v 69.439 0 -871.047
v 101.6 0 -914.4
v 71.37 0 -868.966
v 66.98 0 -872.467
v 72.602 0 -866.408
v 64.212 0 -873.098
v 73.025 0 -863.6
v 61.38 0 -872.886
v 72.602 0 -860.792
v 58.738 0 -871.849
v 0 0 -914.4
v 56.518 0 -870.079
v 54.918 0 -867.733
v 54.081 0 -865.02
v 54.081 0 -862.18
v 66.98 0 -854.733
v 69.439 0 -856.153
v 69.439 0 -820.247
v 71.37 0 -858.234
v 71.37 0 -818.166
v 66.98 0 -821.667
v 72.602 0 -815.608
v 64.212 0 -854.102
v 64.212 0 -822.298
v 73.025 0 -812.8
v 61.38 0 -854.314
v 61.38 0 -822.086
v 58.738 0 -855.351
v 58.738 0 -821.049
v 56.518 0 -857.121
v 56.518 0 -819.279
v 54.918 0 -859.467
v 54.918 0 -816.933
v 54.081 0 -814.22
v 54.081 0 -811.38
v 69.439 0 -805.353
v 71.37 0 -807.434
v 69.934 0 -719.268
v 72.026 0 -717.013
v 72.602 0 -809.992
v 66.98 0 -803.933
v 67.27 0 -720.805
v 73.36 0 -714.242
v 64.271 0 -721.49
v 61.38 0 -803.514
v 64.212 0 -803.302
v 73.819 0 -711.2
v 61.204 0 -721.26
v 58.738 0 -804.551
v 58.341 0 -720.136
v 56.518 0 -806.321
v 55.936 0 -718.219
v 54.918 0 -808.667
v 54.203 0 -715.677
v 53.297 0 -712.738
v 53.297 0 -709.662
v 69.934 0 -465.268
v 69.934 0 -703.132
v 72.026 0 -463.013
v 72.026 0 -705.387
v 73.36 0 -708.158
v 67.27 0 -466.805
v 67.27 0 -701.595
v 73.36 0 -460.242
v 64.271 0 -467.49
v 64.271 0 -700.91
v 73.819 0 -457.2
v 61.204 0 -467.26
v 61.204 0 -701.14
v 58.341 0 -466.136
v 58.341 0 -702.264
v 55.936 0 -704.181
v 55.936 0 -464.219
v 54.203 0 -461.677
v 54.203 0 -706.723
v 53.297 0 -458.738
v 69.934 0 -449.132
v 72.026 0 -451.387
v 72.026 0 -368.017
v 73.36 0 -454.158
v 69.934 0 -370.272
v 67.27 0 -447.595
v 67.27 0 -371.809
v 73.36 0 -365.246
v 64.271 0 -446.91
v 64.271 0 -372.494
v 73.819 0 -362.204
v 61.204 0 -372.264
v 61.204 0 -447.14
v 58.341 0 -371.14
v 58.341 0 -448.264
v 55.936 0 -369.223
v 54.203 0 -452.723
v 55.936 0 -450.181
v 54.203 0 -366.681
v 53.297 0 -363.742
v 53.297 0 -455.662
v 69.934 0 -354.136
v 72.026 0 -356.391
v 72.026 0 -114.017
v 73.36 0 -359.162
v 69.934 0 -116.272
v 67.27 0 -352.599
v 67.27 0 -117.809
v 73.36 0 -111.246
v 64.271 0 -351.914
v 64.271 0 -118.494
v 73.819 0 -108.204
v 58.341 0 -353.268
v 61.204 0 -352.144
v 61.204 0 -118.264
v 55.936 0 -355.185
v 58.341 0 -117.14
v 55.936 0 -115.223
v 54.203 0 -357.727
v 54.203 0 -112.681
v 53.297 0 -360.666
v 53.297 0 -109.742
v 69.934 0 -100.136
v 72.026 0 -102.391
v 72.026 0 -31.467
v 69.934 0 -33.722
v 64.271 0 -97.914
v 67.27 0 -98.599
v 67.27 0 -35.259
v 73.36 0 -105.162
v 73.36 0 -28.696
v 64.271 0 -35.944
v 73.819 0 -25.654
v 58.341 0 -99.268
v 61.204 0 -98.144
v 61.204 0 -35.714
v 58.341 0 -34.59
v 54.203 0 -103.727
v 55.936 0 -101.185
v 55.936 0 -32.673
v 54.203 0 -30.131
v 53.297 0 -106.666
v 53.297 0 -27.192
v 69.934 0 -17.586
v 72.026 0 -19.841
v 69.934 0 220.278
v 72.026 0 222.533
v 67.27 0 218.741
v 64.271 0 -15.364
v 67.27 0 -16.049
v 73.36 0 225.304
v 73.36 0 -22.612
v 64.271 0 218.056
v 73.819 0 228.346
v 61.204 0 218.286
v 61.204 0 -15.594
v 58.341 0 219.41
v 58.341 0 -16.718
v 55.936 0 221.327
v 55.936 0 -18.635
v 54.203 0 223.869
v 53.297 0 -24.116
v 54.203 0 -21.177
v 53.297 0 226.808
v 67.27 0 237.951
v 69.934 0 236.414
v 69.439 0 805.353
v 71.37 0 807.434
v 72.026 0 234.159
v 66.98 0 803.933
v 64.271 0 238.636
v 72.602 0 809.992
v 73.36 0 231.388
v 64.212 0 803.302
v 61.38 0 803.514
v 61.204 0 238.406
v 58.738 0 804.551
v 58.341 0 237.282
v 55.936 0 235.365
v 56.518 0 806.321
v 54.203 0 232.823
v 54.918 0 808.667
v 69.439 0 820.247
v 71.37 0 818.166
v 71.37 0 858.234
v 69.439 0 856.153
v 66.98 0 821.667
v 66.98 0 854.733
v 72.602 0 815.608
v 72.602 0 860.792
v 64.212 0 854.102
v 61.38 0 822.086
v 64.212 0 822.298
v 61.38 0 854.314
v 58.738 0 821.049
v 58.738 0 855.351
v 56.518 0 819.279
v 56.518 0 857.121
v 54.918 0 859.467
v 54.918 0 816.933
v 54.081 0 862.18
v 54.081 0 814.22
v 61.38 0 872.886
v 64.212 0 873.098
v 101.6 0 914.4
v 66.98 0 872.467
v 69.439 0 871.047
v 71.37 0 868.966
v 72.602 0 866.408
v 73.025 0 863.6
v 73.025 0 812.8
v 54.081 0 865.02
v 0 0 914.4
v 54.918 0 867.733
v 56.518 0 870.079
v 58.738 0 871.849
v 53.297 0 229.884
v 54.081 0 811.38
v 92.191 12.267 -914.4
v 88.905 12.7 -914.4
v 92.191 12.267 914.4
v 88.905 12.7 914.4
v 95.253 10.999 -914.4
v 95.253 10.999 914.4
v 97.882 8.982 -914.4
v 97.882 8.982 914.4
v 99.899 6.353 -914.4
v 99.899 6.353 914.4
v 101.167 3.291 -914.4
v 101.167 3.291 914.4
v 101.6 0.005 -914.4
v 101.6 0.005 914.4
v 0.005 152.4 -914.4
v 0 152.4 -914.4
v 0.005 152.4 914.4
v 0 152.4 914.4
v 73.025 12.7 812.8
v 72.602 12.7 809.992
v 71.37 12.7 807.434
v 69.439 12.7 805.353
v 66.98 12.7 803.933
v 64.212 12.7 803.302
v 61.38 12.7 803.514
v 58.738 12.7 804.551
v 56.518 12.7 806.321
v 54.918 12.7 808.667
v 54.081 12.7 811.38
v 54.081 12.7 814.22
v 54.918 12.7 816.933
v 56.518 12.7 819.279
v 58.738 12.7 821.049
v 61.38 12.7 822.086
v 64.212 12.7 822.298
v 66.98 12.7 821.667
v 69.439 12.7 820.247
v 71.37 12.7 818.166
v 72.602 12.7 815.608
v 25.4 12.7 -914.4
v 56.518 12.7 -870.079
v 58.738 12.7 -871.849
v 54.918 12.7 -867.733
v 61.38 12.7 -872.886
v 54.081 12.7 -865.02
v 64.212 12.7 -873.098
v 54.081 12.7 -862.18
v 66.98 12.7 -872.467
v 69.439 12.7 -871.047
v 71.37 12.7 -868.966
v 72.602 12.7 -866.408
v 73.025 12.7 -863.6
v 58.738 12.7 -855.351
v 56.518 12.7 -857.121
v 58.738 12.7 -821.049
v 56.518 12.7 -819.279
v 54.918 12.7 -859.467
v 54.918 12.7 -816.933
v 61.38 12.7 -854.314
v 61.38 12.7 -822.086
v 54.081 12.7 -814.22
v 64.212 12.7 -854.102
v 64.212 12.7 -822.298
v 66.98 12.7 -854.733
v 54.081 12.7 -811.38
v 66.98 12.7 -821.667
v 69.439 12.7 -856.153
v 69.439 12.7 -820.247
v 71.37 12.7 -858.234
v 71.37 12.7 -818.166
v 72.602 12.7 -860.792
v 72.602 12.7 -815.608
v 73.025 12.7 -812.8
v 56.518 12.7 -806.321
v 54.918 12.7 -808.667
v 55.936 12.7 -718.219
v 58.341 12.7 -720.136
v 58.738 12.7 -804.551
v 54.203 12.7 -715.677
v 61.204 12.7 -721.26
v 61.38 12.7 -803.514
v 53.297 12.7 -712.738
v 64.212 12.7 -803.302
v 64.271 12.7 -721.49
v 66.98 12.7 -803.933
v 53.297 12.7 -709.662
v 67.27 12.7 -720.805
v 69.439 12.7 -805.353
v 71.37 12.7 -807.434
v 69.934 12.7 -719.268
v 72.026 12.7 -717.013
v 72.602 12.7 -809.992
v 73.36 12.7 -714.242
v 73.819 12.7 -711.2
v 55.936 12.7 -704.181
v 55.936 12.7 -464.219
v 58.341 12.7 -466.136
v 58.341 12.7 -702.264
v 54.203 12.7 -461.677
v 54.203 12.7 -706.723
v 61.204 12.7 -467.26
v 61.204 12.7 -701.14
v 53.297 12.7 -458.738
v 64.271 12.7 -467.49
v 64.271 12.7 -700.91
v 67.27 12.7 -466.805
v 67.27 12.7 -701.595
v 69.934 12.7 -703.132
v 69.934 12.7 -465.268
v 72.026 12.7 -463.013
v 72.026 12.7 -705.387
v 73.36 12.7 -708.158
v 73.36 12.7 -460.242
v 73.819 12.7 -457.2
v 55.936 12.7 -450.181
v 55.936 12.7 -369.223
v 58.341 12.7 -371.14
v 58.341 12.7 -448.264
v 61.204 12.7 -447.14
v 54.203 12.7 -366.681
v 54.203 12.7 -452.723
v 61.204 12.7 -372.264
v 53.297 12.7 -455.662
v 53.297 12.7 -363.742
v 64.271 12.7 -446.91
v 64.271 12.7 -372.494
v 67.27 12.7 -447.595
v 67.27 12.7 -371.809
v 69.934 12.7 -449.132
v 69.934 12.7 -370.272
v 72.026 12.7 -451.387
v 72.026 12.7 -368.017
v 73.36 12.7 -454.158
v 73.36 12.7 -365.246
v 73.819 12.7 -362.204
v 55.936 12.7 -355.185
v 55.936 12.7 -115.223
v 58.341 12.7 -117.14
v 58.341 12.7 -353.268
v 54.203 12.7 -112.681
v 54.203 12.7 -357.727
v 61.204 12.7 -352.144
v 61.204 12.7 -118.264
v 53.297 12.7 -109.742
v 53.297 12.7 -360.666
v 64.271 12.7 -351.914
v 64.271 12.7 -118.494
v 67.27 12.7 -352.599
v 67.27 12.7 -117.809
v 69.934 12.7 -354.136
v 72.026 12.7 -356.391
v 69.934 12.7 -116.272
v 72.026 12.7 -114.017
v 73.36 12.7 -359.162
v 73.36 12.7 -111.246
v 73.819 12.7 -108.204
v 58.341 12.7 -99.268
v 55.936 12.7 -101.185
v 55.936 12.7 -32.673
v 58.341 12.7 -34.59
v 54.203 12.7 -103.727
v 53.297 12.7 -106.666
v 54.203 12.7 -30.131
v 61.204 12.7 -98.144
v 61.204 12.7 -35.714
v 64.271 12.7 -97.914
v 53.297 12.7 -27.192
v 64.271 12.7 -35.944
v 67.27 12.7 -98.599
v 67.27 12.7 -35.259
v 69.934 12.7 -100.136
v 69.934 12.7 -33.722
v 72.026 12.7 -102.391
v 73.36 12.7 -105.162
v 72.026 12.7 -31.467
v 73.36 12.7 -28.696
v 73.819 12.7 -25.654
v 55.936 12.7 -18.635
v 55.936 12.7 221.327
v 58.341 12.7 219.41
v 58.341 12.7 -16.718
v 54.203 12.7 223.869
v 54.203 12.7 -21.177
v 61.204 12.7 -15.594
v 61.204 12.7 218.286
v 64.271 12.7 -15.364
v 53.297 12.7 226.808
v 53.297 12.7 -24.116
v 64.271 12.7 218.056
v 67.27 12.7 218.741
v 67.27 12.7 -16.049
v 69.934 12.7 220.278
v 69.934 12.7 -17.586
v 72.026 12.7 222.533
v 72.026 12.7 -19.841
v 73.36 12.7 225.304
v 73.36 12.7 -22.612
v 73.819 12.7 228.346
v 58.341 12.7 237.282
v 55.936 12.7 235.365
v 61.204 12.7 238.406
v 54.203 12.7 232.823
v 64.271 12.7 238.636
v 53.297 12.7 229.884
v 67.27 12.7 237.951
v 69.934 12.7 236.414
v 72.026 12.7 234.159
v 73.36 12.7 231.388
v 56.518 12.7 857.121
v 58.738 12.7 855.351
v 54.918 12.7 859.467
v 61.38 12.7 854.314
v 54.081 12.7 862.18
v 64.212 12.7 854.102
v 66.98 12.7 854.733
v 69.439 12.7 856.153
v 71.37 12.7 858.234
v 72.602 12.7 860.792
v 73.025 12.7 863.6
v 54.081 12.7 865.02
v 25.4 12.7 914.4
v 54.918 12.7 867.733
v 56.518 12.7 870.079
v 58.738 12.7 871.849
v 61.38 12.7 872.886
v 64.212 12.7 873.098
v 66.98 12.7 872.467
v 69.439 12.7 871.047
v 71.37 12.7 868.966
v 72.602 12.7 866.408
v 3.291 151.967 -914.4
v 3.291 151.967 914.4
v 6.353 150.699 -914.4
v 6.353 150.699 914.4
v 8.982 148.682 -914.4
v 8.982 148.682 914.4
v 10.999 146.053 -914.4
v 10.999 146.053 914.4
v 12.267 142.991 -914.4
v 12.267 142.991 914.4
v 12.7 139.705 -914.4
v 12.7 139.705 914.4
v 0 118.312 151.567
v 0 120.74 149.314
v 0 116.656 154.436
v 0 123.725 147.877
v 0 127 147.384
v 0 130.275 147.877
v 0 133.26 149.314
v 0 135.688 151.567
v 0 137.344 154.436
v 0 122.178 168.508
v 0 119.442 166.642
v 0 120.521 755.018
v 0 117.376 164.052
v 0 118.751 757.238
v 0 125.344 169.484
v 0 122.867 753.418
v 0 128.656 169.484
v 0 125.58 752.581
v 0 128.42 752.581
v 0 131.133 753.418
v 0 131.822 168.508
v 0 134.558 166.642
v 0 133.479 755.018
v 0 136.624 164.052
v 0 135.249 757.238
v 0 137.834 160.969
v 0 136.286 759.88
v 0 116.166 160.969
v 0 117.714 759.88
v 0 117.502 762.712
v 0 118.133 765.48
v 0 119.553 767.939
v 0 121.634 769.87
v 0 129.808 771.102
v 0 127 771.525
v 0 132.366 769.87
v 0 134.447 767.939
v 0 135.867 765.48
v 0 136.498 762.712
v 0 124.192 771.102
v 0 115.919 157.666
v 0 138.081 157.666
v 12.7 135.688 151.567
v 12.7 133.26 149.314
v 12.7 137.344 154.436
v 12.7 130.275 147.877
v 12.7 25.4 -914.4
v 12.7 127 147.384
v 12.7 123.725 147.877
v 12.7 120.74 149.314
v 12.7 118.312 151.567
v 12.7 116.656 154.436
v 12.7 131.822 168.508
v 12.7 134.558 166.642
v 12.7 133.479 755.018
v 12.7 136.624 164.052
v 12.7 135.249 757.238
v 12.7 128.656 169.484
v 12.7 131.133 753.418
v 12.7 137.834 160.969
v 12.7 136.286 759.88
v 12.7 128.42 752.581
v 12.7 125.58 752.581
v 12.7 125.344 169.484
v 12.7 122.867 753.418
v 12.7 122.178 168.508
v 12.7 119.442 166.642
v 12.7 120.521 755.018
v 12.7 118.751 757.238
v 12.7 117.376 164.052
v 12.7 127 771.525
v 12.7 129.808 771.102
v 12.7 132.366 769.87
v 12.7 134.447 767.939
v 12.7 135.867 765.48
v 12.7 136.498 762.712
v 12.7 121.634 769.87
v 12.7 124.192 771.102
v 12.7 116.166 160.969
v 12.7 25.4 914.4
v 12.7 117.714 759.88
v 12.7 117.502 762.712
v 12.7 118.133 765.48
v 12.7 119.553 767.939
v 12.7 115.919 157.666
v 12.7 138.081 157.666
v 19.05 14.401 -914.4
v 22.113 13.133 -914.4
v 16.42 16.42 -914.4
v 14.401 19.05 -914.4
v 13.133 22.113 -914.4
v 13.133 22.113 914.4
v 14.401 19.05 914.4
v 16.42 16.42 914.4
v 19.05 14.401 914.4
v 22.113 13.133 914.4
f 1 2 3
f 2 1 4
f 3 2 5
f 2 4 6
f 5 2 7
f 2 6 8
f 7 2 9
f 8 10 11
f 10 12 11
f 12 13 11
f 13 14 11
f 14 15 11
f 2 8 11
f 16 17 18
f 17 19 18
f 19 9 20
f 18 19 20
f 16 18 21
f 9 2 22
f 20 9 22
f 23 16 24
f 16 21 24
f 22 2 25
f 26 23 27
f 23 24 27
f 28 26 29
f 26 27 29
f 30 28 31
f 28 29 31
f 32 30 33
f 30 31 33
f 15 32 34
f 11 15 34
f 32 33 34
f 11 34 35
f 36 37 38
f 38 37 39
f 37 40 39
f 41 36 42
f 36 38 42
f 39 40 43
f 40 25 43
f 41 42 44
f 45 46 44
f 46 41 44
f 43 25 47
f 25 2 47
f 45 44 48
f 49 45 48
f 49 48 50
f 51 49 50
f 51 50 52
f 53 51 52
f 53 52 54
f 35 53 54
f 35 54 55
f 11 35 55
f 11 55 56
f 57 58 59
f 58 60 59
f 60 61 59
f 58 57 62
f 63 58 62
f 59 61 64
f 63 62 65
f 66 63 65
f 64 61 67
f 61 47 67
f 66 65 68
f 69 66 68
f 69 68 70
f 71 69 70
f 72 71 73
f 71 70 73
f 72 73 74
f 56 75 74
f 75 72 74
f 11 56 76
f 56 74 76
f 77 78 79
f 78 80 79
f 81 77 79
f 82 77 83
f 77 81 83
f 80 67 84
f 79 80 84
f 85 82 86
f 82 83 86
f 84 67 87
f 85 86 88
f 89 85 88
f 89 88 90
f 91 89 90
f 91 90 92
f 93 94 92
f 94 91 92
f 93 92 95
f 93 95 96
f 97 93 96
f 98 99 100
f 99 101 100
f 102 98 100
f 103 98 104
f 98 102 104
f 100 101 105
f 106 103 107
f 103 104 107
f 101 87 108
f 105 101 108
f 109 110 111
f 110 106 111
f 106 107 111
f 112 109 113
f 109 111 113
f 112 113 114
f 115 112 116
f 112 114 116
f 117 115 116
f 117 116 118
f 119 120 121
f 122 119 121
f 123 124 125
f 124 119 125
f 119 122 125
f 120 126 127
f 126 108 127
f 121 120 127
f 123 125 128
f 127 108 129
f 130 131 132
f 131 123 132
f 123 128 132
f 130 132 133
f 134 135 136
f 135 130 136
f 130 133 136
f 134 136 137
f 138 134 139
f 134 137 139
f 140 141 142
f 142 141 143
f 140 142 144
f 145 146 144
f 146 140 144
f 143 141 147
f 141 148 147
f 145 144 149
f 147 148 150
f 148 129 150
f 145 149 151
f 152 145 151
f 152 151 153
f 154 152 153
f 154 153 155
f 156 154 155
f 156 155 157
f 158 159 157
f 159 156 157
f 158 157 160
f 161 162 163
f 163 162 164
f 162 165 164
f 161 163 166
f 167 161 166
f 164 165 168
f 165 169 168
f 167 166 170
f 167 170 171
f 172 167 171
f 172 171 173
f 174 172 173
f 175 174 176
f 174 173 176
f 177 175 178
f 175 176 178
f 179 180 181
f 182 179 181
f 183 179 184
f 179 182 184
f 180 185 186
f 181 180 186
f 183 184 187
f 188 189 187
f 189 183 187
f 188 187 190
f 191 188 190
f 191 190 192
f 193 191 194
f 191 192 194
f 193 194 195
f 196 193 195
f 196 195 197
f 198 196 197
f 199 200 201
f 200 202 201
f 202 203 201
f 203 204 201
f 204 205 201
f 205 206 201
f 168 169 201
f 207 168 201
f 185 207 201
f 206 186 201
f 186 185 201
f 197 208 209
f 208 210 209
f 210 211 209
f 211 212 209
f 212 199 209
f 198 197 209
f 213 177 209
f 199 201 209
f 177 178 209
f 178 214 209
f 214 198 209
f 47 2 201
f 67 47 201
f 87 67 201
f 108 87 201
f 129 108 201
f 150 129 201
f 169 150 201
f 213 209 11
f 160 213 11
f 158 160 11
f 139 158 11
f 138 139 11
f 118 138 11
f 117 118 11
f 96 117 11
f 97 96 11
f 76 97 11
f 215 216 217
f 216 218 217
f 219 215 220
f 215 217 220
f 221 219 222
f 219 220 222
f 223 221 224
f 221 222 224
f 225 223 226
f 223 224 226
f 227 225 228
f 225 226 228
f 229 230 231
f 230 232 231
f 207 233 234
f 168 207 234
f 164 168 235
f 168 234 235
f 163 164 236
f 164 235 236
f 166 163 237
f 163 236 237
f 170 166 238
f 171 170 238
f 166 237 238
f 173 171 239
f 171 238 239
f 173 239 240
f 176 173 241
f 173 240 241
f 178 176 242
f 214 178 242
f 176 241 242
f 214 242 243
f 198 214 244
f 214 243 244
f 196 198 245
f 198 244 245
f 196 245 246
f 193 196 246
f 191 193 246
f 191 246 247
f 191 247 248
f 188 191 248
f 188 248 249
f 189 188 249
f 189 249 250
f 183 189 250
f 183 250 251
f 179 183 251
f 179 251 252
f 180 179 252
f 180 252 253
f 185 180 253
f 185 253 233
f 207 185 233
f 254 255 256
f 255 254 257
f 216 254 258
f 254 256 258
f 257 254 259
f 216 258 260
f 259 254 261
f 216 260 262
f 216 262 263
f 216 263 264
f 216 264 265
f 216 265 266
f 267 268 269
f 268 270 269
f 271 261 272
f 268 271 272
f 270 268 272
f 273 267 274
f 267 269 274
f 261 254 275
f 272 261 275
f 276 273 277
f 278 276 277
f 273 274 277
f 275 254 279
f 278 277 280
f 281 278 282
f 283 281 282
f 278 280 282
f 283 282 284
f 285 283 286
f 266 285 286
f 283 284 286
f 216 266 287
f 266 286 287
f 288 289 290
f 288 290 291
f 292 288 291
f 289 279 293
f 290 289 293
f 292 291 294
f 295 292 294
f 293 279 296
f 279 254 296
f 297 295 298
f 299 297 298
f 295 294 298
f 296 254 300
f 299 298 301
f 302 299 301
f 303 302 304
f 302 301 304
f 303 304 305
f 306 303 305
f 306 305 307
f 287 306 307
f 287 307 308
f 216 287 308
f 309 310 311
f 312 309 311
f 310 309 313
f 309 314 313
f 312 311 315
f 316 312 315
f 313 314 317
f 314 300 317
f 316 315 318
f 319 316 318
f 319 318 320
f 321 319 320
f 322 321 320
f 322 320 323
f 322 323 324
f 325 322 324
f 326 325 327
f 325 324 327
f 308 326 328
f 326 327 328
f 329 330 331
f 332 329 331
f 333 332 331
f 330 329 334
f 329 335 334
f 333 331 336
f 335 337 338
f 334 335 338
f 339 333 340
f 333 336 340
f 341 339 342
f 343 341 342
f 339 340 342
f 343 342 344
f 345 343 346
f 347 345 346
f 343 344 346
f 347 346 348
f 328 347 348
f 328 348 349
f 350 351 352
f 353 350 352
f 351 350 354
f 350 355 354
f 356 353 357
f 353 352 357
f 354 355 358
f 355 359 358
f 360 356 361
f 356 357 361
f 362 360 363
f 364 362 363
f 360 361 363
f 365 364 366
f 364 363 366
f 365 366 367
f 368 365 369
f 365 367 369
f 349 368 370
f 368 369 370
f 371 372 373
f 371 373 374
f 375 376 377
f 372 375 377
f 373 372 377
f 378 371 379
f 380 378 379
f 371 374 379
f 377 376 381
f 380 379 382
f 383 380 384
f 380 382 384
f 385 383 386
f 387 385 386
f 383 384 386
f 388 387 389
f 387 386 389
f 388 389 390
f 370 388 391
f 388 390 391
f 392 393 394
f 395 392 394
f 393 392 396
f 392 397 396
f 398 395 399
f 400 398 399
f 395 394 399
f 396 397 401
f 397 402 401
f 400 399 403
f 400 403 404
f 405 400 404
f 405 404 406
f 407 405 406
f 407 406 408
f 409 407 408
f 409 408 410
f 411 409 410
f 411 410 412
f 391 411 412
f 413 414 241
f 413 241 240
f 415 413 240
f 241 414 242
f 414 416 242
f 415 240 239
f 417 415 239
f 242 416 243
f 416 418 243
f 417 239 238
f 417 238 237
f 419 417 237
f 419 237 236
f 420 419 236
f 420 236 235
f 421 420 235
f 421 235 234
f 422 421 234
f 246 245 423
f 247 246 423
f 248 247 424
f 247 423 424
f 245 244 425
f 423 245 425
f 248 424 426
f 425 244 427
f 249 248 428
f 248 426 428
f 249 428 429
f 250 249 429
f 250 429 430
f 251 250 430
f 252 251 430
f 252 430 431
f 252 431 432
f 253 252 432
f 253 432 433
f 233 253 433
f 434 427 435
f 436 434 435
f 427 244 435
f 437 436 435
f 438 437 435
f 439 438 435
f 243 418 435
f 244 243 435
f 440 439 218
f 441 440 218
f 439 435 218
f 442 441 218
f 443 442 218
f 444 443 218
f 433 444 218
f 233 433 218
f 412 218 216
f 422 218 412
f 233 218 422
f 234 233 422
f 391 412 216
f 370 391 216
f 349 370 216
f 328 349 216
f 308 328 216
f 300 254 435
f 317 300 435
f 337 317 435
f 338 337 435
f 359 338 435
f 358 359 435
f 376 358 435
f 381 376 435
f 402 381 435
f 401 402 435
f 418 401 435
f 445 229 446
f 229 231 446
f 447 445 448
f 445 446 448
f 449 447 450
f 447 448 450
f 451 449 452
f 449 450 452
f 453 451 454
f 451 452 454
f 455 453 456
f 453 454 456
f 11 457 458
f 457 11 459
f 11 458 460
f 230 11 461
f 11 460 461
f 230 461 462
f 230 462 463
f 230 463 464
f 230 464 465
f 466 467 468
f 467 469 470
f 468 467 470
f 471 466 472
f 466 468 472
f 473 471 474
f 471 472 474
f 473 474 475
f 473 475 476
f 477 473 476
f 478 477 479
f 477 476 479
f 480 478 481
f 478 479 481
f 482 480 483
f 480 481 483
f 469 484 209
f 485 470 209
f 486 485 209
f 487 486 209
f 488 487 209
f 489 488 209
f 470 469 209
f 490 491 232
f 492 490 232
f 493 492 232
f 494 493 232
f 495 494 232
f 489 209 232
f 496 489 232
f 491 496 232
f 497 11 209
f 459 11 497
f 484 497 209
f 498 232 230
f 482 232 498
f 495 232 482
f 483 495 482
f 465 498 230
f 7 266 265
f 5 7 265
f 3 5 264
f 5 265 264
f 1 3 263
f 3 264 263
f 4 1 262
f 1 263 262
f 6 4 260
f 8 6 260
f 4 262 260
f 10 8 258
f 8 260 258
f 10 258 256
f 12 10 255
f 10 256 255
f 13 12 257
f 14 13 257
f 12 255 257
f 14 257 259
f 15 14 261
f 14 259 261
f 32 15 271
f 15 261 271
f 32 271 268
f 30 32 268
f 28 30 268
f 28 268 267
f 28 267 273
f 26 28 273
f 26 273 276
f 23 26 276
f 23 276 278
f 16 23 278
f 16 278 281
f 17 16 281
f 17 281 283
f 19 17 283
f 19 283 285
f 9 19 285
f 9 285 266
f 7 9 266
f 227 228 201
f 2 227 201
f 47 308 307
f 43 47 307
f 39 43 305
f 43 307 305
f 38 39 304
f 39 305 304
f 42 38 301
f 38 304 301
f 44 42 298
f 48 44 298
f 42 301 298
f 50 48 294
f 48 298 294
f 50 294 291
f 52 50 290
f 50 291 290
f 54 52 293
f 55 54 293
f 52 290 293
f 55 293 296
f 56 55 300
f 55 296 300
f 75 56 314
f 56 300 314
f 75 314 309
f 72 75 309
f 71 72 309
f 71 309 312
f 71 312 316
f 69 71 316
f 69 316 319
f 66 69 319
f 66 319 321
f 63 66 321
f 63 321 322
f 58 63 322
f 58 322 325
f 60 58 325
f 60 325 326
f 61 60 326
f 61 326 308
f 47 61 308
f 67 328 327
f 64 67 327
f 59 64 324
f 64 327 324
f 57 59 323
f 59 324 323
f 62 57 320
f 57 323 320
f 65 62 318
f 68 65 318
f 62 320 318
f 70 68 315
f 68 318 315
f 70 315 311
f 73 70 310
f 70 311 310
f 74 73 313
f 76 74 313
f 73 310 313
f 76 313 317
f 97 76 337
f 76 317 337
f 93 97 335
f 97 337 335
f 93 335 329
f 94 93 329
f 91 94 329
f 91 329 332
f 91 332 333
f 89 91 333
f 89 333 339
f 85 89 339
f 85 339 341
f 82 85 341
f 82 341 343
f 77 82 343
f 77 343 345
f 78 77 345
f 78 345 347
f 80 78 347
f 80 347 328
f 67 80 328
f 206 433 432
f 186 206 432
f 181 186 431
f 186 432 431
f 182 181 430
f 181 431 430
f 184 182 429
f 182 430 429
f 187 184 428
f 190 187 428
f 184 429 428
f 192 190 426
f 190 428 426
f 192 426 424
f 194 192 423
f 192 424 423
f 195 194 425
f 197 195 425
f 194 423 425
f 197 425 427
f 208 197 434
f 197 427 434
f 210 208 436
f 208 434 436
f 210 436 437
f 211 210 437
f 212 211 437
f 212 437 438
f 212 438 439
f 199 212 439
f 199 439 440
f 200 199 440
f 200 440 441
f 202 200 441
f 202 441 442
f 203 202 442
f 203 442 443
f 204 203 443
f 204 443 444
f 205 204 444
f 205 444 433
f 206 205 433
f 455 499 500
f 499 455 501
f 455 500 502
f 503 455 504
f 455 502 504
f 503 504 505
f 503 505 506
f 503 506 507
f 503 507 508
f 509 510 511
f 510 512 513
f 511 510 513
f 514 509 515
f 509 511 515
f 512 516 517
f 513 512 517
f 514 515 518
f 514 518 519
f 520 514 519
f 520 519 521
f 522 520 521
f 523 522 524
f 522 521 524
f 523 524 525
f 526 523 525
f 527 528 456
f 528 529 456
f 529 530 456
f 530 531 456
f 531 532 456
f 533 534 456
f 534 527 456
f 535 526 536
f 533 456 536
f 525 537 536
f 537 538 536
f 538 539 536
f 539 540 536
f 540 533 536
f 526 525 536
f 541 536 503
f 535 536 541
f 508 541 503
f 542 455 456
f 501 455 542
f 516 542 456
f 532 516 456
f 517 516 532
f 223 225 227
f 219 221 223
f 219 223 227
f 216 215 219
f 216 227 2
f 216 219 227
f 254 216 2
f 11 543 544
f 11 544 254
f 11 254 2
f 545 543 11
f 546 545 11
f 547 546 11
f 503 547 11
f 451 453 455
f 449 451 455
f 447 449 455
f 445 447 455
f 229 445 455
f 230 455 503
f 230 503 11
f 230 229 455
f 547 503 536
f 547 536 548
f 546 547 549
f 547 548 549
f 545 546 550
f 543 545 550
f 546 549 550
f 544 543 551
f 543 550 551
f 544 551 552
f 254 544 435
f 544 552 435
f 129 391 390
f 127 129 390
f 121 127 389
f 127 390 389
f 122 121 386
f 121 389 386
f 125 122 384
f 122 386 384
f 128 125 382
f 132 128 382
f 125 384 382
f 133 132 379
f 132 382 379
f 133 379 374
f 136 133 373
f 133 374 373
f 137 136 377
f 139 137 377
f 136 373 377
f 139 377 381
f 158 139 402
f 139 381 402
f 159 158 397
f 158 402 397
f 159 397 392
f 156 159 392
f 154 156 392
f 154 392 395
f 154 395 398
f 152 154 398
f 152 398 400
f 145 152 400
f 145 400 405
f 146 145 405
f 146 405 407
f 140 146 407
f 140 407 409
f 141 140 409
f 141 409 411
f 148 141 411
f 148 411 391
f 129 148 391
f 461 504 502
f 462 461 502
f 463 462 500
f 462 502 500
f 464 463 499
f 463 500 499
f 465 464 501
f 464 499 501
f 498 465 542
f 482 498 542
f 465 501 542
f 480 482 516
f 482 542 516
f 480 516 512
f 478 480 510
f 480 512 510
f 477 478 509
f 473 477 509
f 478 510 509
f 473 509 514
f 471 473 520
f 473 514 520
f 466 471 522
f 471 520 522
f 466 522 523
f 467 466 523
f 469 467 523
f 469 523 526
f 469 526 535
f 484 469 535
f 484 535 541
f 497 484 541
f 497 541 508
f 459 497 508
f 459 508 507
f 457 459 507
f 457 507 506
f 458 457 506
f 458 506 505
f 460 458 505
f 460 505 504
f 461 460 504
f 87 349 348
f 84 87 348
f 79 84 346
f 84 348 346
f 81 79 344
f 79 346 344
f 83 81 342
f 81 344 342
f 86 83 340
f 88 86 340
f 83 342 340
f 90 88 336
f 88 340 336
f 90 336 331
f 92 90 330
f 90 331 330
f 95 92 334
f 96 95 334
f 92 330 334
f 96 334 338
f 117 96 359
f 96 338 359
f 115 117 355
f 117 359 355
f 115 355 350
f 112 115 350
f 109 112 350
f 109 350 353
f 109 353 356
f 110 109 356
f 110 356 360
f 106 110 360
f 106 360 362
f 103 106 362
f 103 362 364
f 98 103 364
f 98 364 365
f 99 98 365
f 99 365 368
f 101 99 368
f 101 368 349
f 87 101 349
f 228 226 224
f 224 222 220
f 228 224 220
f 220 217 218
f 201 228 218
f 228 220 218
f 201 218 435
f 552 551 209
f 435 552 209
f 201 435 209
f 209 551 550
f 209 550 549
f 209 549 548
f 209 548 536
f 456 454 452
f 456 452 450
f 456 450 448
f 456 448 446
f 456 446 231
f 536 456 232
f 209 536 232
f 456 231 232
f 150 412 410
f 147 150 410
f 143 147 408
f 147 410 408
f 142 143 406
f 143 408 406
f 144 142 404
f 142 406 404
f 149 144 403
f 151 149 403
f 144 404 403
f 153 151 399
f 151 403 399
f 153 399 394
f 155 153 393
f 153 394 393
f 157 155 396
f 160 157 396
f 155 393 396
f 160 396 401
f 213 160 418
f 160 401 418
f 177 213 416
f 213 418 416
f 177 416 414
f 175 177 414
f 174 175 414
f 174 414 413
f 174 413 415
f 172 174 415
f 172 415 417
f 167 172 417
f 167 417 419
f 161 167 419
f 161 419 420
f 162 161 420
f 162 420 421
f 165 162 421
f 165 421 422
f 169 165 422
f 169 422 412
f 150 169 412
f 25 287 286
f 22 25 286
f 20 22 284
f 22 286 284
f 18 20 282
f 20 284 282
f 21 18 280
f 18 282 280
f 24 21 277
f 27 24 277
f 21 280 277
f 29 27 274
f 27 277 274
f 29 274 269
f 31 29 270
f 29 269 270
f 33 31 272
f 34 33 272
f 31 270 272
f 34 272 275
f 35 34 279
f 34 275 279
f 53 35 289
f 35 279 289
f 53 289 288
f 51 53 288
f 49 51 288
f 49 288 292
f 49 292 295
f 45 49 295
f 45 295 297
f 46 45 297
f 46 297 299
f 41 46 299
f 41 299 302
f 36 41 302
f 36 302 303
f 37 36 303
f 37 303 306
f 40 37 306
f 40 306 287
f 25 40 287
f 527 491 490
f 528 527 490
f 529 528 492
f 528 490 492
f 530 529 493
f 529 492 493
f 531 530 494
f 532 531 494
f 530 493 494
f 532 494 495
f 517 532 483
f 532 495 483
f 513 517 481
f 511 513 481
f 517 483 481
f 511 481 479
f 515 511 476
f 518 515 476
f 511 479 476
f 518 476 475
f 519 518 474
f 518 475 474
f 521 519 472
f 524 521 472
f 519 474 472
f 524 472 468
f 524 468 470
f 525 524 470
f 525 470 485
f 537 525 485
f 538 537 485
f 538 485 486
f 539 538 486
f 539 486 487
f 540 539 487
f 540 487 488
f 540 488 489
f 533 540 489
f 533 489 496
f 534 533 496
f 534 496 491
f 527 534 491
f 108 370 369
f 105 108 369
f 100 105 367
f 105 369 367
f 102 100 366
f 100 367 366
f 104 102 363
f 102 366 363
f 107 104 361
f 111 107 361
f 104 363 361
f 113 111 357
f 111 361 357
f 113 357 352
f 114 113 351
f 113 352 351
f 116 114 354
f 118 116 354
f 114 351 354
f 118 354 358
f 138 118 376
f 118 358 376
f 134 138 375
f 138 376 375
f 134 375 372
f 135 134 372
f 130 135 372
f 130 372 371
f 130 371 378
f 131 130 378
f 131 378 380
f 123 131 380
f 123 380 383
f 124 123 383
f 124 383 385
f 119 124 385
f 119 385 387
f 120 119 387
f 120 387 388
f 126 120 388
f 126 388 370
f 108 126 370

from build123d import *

# Parameters (mm, degrees)
BOSS_EXTRUDE1_DEPTH             = 914.4
CUT_EXTRUDE2_REACH              = 14.7
SKETCH3_R                       = 9.525
SKETCH3_R_2                     = 10.31875
F_3_4_0_75_DIAMETER_HOLE1_D     = 19.05
F_3_4_0_75_DIAMETER_HOLE1_DEPTH = 12.7
SKETCH6_R                       = 11.1125
CUT_EXTRUDE3_DEPTH              = 13.7


with BuildPart() as part:
    # Sketch1 → Boss-Extrude1 (new body, symmetric)
    with BuildSketch(Plane.XY):
        with BuildLine():
            Line((0, 0), (0, 152.4))
            Line((0, 152.4), (0.00508, 152.4))
            ThreePointArc((0.00508, 152.4), (8.981744019, 148.681744019), (12.7, 139.70508))
            Line((12.7, 139.70508), (12.7, 25.4))
            ThreePointArc((12.7, 25.4), (16.419743879, 16.419743879), (25.4, 12.7))
            Line((25.4, 12.7), (88.90508, 12.7))
            ThreePointArc((88.90508, 12.7), (97.881744019, 8.981744019), (101.6, 0.00508))
            Line((101.6, 0.00508), (101.6, 0))
            Line((101.6, 0), (0, 0))
        make_face()
    extrude(amount=BOSS_EXTRUDE1_DEPTH, both=True)

    # Sketch3 → Cut-Extrude2 (cut, up to next)
    with BuildSketch(Plane(origin=(0, 12.7, 0), x_dir=(1, 0, 0), z_dir=(0, 1, 0)), mode=Mode.PRIVATE) as cut_extrude2_sk1:
        with Locations((63.5, -863.6)):
            Circle(SKETCH3_R)
    cut_extrude2_tool1 = extrude(cut_extrude2_sk1.sketch, amount=-CUT_EXTRUDE2_REACH, mode=Mode.PRIVATE) & part.part
    add(cut_extrude2_tool1.solids().sort_by_distance((63.5, 12.7, 863.6))[0], mode=Mode.SUBTRACT)
    # Sketch3 → Cut-Extrude2 (cut, up to next)
    with BuildSketch(Plane(origin=(0, 12.7, 0), x_dir=(1, 0, 0), z_dir=(0, 1, 0)), mode=Mode.PRIVATE) as cut_extrude2_sk2:
        with Locations((63.5, 863.6)):
            Circle(SKETCH3_R)
    cut_extrude2_tool2 = extrude(cut_extrude2_sk2.sketch, amount=-CUT_EXTRUDE2_REACH, mode=Mode.PRIVATE) & part.part
    add(cut_extrude2_tool2.solids().sort_by_distance((63.5, 12.7, -863.6))[0], mode=Mode.SUBTRACT)
    # Sketch3 → Cut-Extrude2 (cut, up to next)
    with BuildSketch(Plane(origin=(0, 12.7, 0), x_dir=(1, 0, 0), z_dir=(0, 1, 0)), mode=Mode.PRIVATE) as cut_extrude2_sk3:
        with Locations((63.5, 25.654)):
            Circle(SKETCH3_R_2)
    cut_extrude2_tool3 = extrude(cut_extrude2_sk3.sketch, amount=-CUT_EXTRUDE2_REACH, mode=Mode.PRIVATE) & part.part
    add(cut_extrude2_tool3.solids().sort_by_distance((63.5, 12.7, -25.654))[0], mode=Mode.SUBTRACT)
    # Sketch3 → Cut-Extrude2 (cut, up to next)
    with BuildSketch(Plane(origin=(0, 12.7, 0), x_dir=(1, 0, 0), z_dir=(0, 1, 0)), mode=Mode.PRIVATE) as cut_extrude2_sk4:
        with Locations((63.5, -812.8)):
            Circle(SKETCH3_R)
    cut_extrude2_tool4 = extrude(cut_extrude2_sk4.sketch, amount=-CUT_EXTRUDE2_REACH, mode=Mode.PRIVATE) & part.part
    add(cut_extrude2_tool4.solids().sort_by_distance((63.5, 12.7, 812.8))[0], mode=Mode.SUBTRACT)
    # Sketch3 → Cut-Extrude2 (cut, up to next)
    with BuildSketch(Plane(origin=(0, 12.7, 0), x_dir=(1, 0, 0), z_dir=(0, 1, 0)), mode=Mode.PRIVATE) as cut_extrude2_sk5:
        with Locations((63.5, 711.2)):
            Circle(SKETCH3_R_2)
    cut_extrude2_tool5 = extrude(cut_extrude2_sk5.sketch, amount=-CUT_EXTRUDE2_REACH, mode=Mode.PRIVATE) & part.part
    add(cut_extrude2_tool5.solids().sort_by_distance((63.5, 12.7, -711.2))[0], mode=Mode.SUBTRACT)
    # Sketch3 → Cut-Extrude2 (cut, up to next)
    with BuildSketch(Plane(origin=(0, 12.7, 0), x_dir=(1, 0, 0), z_dir=(0, 1, 0)), mode=Mode.PRIVATE) as cut_extrude2_sk6:
        with Locations((63.5, 457.2)):
            Circle(SKETCH3_R_2)
    cut_extrude2_tool6 = extrude(cut_extrude2_sk6.sketch, amount=-CUT_EXTRUDE2_REACH, mode=Mode.PRIVATE) & part.part
    add(cut_extrude2_tool6.solids().sort_by_distance((63.5, 12.7, -457.2))[0], mode=Mode.SUBTRACT)
    # Sketch3 → Cut-Extrude2 (cut, up to next)
    with BuildSketch(Plane(origin=(0, 12.7, 0), x_dir=(1, 0, 0), z_dir=(0, 1, 0)), mode=Mode.PRIVATE) as cut_extrude2_sk7:
        with Locations((63.5, -228.346)):
            Circle(SKETCH3_R_2)
    cut_extrude2_tool7 = extrude(cut_extrude2_sk7.sketch, amount=-CUT_EXTRUDE2_REACH, mode=Mode.PRIVATE) & part.part
    add(cut_extrude2_tool7.solids().sort_by_distance((63.5, 12.7, 228.346))[0], mode=Mode.SUBTRACT)
    # Sketch3 → Cut-Extrude2 (cut, up to next)
    with BuildSketch(Plane(origin=(0, 12.7, 0), x_dir=(1, 0, 0), z_dir=(0, 1, 0)), mode=Mode.PRIVATE) as cut_extrude2_sk8:
        with Locations((63.5, 362.204)):
            Circle(SKETCH3_R_2)
    cut_extrude2_tool8 = extrude(cut_extrude2_sk8.sketch, amount=-CUT_EXTRUDE2_REACH, mode=Mode.PRIVATE) & part.part
    add(cut_extrude2_tool8.solids().sort_by_distance((63.5, 12.7, -362.204))[0], mode=Mode.SUBTRACT)
    # Sketch3 → Cut-Extrude2 (cut, up to next)
    with BuildSketch(Plane(origin=(0, 12.7, 0), x_dir=(1, 0, 0), z_dir=(0, 1, 0)), mode=Mode.PRIVATE) as cut_extrude2_sk9:
        with Locations((63.5, 108.204)):
            Circle(SKETCH3_R_2)
    cut_extrude2_tool9 = extrude(cut_extrude2_sk9.sketch, amount=-CUT_EXTRUDE2_REACH, mode=Mode.PRIVATE) & part.part
    add(cut_extrude2_tool9.solids().sort_by_distance((63.5, 12.7, -108.204))[0], mode=Mode.SUBTRACT)
    # Sketch3 → Cut-Extrude2 (cut, up to next)
    with BuildSketch(Plane(origin=(0, 12.7, 0), x_dir=(1, 0, 0), z_dir=(0, 1, 0)), mode=Mode.PRIVATE) as cut_extrude2_sk10:
        with Locations((63.5, 812.8)):
            Circle(SKETCH3_R)
    cut_extrude2_tool10 = extrude(cut_extrude2_sk10.sketch, amount=-CUT_EXTRUDE2_REACH, mode=Mode.PRIVATE) & part.part
    add(cut_extrude2_tool10.solids().sort_by_distance((63.5, 12.7, -812.8))[0], mode=Mode.SUBTRACT)

    # 3/4 (0.75) Diameter Hole1
    with Locations(Plane(origin=(12.7, 0, 0), x_dir=(0, 0, -1), z_dir=(1, 0, 0))):
        with Locations((-762, 127)):
            Hole(F_3_4_0_75_DIAMETER_HOLE1_D / 2, depth=F_3_4_0_75_DIAMETER_HOLE1_DEPTH)

    # Sketch6 → Cut-Extrude3 (cut, through all)
    with BuildSketch(Plane(origin=(12.7, 0, 0), x_dir=(0, 0, -1), z_dir=(1, 0, 0))):
        with Locations((-158.496, 127)):
            Circle(SKETCH6_R)
    extrude(amount=-CUT_EXTRUDE3_DEPTH, mode=Mode.SUBTRACT)


solid = part.part
